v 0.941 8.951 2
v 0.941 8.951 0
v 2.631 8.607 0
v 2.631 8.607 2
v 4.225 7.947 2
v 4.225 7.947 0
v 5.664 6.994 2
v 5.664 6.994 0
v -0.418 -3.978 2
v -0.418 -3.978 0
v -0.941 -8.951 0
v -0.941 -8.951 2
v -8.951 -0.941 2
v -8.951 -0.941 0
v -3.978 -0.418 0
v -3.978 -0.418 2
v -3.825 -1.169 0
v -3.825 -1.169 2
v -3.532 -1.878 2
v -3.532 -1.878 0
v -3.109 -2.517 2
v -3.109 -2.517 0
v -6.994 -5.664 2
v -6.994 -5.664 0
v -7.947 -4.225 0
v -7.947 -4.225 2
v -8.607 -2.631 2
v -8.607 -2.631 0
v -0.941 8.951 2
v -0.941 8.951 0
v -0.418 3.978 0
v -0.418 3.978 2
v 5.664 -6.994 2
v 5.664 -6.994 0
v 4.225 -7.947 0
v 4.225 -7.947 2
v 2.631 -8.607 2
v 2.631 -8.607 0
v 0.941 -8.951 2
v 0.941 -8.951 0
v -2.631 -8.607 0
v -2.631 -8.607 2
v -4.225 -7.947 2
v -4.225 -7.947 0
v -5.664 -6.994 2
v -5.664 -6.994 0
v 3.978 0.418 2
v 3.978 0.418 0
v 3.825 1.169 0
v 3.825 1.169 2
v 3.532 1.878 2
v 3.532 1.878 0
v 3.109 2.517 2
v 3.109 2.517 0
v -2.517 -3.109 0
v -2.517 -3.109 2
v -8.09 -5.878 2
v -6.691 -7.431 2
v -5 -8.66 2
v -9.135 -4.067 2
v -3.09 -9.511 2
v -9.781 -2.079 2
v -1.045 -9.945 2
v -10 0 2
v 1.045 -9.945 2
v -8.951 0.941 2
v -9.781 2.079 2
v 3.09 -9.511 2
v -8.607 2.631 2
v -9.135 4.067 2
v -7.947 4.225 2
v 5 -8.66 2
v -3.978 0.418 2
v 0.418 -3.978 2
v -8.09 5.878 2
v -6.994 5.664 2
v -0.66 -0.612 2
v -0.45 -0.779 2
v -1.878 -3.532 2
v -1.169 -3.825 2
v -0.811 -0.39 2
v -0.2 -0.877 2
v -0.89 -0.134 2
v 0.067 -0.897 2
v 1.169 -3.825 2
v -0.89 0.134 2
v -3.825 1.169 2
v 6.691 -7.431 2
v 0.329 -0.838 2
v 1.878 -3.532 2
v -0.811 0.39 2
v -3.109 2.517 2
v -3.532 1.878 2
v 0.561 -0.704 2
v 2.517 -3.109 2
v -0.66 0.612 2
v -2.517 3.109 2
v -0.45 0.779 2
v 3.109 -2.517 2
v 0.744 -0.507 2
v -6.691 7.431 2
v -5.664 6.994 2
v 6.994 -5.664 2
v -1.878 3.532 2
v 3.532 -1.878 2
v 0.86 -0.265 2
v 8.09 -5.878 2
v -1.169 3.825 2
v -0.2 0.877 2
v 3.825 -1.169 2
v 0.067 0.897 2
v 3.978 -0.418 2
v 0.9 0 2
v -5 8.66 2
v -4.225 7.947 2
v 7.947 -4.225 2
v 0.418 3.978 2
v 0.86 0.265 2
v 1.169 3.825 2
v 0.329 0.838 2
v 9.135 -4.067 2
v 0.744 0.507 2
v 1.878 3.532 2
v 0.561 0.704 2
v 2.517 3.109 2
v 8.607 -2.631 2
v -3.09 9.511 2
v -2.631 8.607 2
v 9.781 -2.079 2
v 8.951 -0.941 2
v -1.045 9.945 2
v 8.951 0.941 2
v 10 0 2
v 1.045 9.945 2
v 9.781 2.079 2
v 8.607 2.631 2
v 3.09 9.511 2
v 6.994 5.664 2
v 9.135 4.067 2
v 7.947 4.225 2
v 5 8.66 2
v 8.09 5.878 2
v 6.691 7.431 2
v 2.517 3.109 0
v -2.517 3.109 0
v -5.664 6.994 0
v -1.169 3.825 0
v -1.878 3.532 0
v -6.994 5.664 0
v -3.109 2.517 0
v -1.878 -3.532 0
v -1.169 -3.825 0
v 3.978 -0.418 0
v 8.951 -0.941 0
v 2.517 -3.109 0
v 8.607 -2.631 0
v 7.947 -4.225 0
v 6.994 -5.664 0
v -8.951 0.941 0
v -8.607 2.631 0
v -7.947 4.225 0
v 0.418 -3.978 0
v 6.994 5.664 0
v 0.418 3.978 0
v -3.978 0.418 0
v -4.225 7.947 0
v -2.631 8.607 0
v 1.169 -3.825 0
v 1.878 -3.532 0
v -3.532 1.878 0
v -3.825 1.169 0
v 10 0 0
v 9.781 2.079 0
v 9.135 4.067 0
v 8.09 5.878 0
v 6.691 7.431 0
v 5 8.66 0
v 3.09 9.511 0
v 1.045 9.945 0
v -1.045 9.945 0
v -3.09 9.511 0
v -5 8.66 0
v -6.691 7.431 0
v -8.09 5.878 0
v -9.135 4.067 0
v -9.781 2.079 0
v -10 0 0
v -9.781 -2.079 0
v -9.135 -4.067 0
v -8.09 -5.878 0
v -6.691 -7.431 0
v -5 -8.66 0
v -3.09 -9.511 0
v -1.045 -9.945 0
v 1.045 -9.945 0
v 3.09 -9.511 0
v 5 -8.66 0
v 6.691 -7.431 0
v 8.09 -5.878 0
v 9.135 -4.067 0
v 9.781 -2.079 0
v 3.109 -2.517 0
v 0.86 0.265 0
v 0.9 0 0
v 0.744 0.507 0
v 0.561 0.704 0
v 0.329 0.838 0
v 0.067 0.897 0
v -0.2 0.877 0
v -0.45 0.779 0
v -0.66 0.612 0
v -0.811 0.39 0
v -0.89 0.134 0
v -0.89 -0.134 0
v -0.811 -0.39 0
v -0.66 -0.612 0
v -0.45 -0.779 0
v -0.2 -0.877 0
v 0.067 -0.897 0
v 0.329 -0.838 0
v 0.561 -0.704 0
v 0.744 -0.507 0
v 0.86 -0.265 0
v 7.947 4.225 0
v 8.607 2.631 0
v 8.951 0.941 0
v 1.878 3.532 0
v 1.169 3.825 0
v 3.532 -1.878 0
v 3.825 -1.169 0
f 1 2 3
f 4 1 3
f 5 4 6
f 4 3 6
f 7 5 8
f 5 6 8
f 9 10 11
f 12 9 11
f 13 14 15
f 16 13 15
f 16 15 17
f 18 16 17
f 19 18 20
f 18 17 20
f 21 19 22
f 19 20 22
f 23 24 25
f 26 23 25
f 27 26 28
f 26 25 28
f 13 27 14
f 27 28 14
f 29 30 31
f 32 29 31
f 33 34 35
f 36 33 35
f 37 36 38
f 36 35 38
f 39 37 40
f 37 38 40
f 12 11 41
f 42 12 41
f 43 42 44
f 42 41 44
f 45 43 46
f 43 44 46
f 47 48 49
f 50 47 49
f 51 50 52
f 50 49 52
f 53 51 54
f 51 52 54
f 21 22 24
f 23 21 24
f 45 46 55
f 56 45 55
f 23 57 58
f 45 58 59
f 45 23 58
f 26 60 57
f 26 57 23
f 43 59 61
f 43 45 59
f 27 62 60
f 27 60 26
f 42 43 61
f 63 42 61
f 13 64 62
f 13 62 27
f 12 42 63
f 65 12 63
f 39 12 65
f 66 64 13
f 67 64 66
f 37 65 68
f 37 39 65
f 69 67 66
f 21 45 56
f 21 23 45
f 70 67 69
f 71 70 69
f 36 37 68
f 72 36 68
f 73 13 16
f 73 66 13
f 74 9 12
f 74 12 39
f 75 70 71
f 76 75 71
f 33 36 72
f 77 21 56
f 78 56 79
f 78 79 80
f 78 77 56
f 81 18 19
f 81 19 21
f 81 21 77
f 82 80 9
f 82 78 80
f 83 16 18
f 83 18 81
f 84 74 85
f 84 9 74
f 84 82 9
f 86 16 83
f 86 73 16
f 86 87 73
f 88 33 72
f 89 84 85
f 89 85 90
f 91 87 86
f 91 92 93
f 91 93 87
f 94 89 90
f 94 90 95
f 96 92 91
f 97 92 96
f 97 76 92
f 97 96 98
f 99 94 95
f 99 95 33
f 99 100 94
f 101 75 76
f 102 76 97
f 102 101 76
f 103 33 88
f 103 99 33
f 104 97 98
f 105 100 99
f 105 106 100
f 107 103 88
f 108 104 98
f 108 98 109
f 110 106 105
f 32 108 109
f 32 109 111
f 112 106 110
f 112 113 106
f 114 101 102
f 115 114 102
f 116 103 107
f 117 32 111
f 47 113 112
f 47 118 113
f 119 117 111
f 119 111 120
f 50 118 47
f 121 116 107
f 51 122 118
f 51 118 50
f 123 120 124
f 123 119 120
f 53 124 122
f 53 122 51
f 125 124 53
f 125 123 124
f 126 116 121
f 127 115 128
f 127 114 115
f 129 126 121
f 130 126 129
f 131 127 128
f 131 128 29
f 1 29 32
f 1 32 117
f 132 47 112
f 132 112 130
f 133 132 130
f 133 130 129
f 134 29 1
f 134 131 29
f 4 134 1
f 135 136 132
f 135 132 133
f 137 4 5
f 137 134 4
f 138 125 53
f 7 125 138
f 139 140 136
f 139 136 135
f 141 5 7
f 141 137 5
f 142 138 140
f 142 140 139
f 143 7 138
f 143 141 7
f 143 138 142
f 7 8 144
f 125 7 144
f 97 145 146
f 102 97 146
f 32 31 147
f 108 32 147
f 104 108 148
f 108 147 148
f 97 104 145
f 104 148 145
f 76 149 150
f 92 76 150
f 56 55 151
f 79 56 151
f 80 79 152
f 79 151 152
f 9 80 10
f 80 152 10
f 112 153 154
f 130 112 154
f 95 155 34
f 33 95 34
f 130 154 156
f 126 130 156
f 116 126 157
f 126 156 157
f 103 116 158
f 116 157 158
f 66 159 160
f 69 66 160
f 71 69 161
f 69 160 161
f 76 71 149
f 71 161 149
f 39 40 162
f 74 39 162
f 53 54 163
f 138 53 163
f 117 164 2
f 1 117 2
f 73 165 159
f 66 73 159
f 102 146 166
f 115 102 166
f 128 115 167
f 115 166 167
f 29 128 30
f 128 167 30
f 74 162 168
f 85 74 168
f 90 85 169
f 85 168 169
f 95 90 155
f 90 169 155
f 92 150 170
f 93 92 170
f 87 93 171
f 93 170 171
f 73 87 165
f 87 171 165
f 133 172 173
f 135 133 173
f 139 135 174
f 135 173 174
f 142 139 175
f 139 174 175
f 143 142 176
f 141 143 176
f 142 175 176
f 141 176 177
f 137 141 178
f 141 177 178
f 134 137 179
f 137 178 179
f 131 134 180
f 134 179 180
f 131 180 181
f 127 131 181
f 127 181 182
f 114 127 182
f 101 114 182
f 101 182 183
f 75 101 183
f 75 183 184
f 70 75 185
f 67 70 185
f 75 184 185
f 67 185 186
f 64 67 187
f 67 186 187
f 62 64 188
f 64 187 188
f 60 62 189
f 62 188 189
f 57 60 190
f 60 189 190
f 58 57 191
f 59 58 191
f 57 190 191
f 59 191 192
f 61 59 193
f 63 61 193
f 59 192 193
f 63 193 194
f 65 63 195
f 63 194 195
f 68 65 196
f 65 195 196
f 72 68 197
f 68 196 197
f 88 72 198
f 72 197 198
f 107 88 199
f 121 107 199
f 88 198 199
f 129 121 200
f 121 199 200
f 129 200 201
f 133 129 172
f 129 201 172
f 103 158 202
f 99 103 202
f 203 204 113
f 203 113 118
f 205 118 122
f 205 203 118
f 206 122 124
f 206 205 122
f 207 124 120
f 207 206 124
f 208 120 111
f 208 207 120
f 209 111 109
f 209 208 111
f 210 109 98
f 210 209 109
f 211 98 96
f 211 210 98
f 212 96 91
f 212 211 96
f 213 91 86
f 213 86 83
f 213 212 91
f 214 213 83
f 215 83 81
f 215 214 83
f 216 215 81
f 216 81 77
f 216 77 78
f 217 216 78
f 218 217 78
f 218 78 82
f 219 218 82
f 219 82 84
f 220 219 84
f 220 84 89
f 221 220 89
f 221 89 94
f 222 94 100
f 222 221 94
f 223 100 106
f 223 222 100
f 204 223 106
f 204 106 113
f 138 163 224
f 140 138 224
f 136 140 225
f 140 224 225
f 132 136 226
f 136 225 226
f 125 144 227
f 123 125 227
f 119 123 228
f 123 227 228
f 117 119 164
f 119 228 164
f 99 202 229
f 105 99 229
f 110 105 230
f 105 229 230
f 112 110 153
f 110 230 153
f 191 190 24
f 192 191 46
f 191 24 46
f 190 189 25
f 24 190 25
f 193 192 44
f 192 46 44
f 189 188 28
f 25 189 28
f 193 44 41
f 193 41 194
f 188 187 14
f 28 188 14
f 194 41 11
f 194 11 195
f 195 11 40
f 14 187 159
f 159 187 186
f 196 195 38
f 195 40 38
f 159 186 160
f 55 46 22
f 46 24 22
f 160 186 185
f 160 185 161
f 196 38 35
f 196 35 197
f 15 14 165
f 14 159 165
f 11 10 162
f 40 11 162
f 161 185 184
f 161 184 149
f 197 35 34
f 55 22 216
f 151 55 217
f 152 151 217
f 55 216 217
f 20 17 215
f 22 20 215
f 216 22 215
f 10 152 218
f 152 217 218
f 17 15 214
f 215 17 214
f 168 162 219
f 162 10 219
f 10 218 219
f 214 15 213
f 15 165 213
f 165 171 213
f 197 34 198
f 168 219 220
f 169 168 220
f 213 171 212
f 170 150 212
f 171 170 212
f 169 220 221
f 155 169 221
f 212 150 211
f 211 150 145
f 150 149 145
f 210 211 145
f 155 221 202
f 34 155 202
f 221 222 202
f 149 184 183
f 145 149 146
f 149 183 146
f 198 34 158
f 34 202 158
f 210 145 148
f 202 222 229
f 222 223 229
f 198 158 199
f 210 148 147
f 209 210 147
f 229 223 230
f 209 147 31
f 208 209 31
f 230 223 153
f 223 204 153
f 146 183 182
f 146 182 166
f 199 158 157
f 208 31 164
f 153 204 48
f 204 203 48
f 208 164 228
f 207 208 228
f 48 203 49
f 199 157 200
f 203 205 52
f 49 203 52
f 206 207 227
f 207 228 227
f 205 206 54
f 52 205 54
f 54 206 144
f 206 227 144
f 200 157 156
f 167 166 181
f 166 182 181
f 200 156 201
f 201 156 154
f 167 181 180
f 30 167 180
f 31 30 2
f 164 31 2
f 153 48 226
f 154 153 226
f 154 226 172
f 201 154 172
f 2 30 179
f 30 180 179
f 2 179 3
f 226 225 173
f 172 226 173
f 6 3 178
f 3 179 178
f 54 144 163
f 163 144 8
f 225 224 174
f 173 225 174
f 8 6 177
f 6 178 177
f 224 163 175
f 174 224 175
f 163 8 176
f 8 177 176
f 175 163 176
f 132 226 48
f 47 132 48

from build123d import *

# Parameters (mm, degrees)
F0_R     = 10
F0_R_2   = 0.9
F1_DEPTH = 2


with BuildPart() as f1:
    # F0 (on Top) → F1 (new body)
    with BuildSketch(Plane.XY):
        Circle(F0_R)
        with BuildLine():
            ThreePointArc((-2.517282, -3.108584), (-1.530734, -3.695518), (-0.418114, -3.978088))
            Line((-0.418114, -3.978088), (-0.940756, -8.950697))
            ThreePointArc((-0.940756, -8.950697), (-3.444151, -8.314916), (-5.663884, -6.994314))
            Line((-5.663884, -6.994314), (-2.517282, -3.108584))
        make_face(mode=Mode.SUBTRACT)
        with BuildLine():
            ThreePointArc((-6.994314, -5.663884), (-8.314916, -3.444151), (-8.950697, -0.940756))
            Line((-8.950697, -0.940756), (-3.978088, -0.418114))
            ThreePointArc((-3.978088, -0.418114), (-3.695518, -1.530734), (-3.108584, -2.517282))
            Line((-3.108584, -2.517282), (-6.994314, -5.663884))
        make_face(mode=Mode.SUBTRACT)
        with BuildLine():
            ThreePointArc((0.418114, -3.978088), (1.530734, -3.695518), (2.517282, -3.108584))
            Line((2.517282, -3.108584), (5.663884, -6.994314))
            ThreePointArc((5.663884, -6.994314), (3.444151, -8.314916), (0.940756, -8.950697))
            Line((0.940756, -8.950697), (0.418114, -3.978088))
        make_face(mode=Mode.SUBTRACT)
        with BuildLine():
            Line((6.994314, -5.663884), (3.108584, -2.517282))
            ThreePointArc((3.108584, -2.517282), (3.695518, -1.530734), (3.978088, -0.418114))
            Line((3.978088, -0.418114), (8.950697, -0.940756))
            ThreePointArc((8.950697, -0.940756), (8.314916, -3.444151), (6.994314, -5.663884))
        make_face(mode=Mode.SUBTRACT)
        with BuildLine():
            Line((-6.994314, 5.663884), (-3.108584, 2.517282))
            ThreePointArc((-3.108584, 2.517282), (-3.695518, 1.530734), (-3.978088, 0.418114))
            Line((-3.978088, 0.418114), (-8.950697, 0.940756))
            ThreePointArc((-8.950697, 0.940756), (-8.314916, 3.444151), (-6.994314, 5.663884))
        make_face(mode=Mode.SUBTRACT)
        with BuildLine():
            Line((-0.940756, 8.950697), (-0.418114, 3.978088))
            ThreePointArc((-0.418114, 3.978088), (-1.530734, 3.695518), (-2.517282, 3.108584))
            Line((-2.517282, 3.108584), (-5.663884, 6.994314))
            ThreePointArc((-5.663884, 6.994314), (-3.444151, 8.314916), (-0.940756, 8.950697))
        make_face(mode=Mode.SUBTRACT)
        Circle(F0_R_2, mode=Mode.SUBTRACT)
        with BuildLine():
            ThreePointArc((3.978088, 0.418114), (3.695518, 1.530734), (3.108584, 2.517282))
            Line((3.108584, 2.517282), (6.994314, 5.663884))
            ThreePointArc((6.994314, 5.663884), (8.314916, 3.444151), (8.950697, 0.940756))
            Line((8.950697, 0.940756), (3.978088, 0.418114))
        make_face(mode=Mode.SUBTRACT)
        with BuildLine():
            Line((5.663884, 6.994314), (2.517282, 3.108584))
            ThreePointArc((2.517282, 3.108584), (1.530734, 3.695518), (0.418114, 3.978088))
            Line((0.418114, 3.978088), (0.940756, 8.950697))
            ThreePointArc((0.940756, 8.950697), (3.444151, 8.314916), (5.663884, 6.994314))
        make_face(mode=Mode.SUBTRACT)
    extrude(amount=F1_DEPTH)


solid = f1.part
